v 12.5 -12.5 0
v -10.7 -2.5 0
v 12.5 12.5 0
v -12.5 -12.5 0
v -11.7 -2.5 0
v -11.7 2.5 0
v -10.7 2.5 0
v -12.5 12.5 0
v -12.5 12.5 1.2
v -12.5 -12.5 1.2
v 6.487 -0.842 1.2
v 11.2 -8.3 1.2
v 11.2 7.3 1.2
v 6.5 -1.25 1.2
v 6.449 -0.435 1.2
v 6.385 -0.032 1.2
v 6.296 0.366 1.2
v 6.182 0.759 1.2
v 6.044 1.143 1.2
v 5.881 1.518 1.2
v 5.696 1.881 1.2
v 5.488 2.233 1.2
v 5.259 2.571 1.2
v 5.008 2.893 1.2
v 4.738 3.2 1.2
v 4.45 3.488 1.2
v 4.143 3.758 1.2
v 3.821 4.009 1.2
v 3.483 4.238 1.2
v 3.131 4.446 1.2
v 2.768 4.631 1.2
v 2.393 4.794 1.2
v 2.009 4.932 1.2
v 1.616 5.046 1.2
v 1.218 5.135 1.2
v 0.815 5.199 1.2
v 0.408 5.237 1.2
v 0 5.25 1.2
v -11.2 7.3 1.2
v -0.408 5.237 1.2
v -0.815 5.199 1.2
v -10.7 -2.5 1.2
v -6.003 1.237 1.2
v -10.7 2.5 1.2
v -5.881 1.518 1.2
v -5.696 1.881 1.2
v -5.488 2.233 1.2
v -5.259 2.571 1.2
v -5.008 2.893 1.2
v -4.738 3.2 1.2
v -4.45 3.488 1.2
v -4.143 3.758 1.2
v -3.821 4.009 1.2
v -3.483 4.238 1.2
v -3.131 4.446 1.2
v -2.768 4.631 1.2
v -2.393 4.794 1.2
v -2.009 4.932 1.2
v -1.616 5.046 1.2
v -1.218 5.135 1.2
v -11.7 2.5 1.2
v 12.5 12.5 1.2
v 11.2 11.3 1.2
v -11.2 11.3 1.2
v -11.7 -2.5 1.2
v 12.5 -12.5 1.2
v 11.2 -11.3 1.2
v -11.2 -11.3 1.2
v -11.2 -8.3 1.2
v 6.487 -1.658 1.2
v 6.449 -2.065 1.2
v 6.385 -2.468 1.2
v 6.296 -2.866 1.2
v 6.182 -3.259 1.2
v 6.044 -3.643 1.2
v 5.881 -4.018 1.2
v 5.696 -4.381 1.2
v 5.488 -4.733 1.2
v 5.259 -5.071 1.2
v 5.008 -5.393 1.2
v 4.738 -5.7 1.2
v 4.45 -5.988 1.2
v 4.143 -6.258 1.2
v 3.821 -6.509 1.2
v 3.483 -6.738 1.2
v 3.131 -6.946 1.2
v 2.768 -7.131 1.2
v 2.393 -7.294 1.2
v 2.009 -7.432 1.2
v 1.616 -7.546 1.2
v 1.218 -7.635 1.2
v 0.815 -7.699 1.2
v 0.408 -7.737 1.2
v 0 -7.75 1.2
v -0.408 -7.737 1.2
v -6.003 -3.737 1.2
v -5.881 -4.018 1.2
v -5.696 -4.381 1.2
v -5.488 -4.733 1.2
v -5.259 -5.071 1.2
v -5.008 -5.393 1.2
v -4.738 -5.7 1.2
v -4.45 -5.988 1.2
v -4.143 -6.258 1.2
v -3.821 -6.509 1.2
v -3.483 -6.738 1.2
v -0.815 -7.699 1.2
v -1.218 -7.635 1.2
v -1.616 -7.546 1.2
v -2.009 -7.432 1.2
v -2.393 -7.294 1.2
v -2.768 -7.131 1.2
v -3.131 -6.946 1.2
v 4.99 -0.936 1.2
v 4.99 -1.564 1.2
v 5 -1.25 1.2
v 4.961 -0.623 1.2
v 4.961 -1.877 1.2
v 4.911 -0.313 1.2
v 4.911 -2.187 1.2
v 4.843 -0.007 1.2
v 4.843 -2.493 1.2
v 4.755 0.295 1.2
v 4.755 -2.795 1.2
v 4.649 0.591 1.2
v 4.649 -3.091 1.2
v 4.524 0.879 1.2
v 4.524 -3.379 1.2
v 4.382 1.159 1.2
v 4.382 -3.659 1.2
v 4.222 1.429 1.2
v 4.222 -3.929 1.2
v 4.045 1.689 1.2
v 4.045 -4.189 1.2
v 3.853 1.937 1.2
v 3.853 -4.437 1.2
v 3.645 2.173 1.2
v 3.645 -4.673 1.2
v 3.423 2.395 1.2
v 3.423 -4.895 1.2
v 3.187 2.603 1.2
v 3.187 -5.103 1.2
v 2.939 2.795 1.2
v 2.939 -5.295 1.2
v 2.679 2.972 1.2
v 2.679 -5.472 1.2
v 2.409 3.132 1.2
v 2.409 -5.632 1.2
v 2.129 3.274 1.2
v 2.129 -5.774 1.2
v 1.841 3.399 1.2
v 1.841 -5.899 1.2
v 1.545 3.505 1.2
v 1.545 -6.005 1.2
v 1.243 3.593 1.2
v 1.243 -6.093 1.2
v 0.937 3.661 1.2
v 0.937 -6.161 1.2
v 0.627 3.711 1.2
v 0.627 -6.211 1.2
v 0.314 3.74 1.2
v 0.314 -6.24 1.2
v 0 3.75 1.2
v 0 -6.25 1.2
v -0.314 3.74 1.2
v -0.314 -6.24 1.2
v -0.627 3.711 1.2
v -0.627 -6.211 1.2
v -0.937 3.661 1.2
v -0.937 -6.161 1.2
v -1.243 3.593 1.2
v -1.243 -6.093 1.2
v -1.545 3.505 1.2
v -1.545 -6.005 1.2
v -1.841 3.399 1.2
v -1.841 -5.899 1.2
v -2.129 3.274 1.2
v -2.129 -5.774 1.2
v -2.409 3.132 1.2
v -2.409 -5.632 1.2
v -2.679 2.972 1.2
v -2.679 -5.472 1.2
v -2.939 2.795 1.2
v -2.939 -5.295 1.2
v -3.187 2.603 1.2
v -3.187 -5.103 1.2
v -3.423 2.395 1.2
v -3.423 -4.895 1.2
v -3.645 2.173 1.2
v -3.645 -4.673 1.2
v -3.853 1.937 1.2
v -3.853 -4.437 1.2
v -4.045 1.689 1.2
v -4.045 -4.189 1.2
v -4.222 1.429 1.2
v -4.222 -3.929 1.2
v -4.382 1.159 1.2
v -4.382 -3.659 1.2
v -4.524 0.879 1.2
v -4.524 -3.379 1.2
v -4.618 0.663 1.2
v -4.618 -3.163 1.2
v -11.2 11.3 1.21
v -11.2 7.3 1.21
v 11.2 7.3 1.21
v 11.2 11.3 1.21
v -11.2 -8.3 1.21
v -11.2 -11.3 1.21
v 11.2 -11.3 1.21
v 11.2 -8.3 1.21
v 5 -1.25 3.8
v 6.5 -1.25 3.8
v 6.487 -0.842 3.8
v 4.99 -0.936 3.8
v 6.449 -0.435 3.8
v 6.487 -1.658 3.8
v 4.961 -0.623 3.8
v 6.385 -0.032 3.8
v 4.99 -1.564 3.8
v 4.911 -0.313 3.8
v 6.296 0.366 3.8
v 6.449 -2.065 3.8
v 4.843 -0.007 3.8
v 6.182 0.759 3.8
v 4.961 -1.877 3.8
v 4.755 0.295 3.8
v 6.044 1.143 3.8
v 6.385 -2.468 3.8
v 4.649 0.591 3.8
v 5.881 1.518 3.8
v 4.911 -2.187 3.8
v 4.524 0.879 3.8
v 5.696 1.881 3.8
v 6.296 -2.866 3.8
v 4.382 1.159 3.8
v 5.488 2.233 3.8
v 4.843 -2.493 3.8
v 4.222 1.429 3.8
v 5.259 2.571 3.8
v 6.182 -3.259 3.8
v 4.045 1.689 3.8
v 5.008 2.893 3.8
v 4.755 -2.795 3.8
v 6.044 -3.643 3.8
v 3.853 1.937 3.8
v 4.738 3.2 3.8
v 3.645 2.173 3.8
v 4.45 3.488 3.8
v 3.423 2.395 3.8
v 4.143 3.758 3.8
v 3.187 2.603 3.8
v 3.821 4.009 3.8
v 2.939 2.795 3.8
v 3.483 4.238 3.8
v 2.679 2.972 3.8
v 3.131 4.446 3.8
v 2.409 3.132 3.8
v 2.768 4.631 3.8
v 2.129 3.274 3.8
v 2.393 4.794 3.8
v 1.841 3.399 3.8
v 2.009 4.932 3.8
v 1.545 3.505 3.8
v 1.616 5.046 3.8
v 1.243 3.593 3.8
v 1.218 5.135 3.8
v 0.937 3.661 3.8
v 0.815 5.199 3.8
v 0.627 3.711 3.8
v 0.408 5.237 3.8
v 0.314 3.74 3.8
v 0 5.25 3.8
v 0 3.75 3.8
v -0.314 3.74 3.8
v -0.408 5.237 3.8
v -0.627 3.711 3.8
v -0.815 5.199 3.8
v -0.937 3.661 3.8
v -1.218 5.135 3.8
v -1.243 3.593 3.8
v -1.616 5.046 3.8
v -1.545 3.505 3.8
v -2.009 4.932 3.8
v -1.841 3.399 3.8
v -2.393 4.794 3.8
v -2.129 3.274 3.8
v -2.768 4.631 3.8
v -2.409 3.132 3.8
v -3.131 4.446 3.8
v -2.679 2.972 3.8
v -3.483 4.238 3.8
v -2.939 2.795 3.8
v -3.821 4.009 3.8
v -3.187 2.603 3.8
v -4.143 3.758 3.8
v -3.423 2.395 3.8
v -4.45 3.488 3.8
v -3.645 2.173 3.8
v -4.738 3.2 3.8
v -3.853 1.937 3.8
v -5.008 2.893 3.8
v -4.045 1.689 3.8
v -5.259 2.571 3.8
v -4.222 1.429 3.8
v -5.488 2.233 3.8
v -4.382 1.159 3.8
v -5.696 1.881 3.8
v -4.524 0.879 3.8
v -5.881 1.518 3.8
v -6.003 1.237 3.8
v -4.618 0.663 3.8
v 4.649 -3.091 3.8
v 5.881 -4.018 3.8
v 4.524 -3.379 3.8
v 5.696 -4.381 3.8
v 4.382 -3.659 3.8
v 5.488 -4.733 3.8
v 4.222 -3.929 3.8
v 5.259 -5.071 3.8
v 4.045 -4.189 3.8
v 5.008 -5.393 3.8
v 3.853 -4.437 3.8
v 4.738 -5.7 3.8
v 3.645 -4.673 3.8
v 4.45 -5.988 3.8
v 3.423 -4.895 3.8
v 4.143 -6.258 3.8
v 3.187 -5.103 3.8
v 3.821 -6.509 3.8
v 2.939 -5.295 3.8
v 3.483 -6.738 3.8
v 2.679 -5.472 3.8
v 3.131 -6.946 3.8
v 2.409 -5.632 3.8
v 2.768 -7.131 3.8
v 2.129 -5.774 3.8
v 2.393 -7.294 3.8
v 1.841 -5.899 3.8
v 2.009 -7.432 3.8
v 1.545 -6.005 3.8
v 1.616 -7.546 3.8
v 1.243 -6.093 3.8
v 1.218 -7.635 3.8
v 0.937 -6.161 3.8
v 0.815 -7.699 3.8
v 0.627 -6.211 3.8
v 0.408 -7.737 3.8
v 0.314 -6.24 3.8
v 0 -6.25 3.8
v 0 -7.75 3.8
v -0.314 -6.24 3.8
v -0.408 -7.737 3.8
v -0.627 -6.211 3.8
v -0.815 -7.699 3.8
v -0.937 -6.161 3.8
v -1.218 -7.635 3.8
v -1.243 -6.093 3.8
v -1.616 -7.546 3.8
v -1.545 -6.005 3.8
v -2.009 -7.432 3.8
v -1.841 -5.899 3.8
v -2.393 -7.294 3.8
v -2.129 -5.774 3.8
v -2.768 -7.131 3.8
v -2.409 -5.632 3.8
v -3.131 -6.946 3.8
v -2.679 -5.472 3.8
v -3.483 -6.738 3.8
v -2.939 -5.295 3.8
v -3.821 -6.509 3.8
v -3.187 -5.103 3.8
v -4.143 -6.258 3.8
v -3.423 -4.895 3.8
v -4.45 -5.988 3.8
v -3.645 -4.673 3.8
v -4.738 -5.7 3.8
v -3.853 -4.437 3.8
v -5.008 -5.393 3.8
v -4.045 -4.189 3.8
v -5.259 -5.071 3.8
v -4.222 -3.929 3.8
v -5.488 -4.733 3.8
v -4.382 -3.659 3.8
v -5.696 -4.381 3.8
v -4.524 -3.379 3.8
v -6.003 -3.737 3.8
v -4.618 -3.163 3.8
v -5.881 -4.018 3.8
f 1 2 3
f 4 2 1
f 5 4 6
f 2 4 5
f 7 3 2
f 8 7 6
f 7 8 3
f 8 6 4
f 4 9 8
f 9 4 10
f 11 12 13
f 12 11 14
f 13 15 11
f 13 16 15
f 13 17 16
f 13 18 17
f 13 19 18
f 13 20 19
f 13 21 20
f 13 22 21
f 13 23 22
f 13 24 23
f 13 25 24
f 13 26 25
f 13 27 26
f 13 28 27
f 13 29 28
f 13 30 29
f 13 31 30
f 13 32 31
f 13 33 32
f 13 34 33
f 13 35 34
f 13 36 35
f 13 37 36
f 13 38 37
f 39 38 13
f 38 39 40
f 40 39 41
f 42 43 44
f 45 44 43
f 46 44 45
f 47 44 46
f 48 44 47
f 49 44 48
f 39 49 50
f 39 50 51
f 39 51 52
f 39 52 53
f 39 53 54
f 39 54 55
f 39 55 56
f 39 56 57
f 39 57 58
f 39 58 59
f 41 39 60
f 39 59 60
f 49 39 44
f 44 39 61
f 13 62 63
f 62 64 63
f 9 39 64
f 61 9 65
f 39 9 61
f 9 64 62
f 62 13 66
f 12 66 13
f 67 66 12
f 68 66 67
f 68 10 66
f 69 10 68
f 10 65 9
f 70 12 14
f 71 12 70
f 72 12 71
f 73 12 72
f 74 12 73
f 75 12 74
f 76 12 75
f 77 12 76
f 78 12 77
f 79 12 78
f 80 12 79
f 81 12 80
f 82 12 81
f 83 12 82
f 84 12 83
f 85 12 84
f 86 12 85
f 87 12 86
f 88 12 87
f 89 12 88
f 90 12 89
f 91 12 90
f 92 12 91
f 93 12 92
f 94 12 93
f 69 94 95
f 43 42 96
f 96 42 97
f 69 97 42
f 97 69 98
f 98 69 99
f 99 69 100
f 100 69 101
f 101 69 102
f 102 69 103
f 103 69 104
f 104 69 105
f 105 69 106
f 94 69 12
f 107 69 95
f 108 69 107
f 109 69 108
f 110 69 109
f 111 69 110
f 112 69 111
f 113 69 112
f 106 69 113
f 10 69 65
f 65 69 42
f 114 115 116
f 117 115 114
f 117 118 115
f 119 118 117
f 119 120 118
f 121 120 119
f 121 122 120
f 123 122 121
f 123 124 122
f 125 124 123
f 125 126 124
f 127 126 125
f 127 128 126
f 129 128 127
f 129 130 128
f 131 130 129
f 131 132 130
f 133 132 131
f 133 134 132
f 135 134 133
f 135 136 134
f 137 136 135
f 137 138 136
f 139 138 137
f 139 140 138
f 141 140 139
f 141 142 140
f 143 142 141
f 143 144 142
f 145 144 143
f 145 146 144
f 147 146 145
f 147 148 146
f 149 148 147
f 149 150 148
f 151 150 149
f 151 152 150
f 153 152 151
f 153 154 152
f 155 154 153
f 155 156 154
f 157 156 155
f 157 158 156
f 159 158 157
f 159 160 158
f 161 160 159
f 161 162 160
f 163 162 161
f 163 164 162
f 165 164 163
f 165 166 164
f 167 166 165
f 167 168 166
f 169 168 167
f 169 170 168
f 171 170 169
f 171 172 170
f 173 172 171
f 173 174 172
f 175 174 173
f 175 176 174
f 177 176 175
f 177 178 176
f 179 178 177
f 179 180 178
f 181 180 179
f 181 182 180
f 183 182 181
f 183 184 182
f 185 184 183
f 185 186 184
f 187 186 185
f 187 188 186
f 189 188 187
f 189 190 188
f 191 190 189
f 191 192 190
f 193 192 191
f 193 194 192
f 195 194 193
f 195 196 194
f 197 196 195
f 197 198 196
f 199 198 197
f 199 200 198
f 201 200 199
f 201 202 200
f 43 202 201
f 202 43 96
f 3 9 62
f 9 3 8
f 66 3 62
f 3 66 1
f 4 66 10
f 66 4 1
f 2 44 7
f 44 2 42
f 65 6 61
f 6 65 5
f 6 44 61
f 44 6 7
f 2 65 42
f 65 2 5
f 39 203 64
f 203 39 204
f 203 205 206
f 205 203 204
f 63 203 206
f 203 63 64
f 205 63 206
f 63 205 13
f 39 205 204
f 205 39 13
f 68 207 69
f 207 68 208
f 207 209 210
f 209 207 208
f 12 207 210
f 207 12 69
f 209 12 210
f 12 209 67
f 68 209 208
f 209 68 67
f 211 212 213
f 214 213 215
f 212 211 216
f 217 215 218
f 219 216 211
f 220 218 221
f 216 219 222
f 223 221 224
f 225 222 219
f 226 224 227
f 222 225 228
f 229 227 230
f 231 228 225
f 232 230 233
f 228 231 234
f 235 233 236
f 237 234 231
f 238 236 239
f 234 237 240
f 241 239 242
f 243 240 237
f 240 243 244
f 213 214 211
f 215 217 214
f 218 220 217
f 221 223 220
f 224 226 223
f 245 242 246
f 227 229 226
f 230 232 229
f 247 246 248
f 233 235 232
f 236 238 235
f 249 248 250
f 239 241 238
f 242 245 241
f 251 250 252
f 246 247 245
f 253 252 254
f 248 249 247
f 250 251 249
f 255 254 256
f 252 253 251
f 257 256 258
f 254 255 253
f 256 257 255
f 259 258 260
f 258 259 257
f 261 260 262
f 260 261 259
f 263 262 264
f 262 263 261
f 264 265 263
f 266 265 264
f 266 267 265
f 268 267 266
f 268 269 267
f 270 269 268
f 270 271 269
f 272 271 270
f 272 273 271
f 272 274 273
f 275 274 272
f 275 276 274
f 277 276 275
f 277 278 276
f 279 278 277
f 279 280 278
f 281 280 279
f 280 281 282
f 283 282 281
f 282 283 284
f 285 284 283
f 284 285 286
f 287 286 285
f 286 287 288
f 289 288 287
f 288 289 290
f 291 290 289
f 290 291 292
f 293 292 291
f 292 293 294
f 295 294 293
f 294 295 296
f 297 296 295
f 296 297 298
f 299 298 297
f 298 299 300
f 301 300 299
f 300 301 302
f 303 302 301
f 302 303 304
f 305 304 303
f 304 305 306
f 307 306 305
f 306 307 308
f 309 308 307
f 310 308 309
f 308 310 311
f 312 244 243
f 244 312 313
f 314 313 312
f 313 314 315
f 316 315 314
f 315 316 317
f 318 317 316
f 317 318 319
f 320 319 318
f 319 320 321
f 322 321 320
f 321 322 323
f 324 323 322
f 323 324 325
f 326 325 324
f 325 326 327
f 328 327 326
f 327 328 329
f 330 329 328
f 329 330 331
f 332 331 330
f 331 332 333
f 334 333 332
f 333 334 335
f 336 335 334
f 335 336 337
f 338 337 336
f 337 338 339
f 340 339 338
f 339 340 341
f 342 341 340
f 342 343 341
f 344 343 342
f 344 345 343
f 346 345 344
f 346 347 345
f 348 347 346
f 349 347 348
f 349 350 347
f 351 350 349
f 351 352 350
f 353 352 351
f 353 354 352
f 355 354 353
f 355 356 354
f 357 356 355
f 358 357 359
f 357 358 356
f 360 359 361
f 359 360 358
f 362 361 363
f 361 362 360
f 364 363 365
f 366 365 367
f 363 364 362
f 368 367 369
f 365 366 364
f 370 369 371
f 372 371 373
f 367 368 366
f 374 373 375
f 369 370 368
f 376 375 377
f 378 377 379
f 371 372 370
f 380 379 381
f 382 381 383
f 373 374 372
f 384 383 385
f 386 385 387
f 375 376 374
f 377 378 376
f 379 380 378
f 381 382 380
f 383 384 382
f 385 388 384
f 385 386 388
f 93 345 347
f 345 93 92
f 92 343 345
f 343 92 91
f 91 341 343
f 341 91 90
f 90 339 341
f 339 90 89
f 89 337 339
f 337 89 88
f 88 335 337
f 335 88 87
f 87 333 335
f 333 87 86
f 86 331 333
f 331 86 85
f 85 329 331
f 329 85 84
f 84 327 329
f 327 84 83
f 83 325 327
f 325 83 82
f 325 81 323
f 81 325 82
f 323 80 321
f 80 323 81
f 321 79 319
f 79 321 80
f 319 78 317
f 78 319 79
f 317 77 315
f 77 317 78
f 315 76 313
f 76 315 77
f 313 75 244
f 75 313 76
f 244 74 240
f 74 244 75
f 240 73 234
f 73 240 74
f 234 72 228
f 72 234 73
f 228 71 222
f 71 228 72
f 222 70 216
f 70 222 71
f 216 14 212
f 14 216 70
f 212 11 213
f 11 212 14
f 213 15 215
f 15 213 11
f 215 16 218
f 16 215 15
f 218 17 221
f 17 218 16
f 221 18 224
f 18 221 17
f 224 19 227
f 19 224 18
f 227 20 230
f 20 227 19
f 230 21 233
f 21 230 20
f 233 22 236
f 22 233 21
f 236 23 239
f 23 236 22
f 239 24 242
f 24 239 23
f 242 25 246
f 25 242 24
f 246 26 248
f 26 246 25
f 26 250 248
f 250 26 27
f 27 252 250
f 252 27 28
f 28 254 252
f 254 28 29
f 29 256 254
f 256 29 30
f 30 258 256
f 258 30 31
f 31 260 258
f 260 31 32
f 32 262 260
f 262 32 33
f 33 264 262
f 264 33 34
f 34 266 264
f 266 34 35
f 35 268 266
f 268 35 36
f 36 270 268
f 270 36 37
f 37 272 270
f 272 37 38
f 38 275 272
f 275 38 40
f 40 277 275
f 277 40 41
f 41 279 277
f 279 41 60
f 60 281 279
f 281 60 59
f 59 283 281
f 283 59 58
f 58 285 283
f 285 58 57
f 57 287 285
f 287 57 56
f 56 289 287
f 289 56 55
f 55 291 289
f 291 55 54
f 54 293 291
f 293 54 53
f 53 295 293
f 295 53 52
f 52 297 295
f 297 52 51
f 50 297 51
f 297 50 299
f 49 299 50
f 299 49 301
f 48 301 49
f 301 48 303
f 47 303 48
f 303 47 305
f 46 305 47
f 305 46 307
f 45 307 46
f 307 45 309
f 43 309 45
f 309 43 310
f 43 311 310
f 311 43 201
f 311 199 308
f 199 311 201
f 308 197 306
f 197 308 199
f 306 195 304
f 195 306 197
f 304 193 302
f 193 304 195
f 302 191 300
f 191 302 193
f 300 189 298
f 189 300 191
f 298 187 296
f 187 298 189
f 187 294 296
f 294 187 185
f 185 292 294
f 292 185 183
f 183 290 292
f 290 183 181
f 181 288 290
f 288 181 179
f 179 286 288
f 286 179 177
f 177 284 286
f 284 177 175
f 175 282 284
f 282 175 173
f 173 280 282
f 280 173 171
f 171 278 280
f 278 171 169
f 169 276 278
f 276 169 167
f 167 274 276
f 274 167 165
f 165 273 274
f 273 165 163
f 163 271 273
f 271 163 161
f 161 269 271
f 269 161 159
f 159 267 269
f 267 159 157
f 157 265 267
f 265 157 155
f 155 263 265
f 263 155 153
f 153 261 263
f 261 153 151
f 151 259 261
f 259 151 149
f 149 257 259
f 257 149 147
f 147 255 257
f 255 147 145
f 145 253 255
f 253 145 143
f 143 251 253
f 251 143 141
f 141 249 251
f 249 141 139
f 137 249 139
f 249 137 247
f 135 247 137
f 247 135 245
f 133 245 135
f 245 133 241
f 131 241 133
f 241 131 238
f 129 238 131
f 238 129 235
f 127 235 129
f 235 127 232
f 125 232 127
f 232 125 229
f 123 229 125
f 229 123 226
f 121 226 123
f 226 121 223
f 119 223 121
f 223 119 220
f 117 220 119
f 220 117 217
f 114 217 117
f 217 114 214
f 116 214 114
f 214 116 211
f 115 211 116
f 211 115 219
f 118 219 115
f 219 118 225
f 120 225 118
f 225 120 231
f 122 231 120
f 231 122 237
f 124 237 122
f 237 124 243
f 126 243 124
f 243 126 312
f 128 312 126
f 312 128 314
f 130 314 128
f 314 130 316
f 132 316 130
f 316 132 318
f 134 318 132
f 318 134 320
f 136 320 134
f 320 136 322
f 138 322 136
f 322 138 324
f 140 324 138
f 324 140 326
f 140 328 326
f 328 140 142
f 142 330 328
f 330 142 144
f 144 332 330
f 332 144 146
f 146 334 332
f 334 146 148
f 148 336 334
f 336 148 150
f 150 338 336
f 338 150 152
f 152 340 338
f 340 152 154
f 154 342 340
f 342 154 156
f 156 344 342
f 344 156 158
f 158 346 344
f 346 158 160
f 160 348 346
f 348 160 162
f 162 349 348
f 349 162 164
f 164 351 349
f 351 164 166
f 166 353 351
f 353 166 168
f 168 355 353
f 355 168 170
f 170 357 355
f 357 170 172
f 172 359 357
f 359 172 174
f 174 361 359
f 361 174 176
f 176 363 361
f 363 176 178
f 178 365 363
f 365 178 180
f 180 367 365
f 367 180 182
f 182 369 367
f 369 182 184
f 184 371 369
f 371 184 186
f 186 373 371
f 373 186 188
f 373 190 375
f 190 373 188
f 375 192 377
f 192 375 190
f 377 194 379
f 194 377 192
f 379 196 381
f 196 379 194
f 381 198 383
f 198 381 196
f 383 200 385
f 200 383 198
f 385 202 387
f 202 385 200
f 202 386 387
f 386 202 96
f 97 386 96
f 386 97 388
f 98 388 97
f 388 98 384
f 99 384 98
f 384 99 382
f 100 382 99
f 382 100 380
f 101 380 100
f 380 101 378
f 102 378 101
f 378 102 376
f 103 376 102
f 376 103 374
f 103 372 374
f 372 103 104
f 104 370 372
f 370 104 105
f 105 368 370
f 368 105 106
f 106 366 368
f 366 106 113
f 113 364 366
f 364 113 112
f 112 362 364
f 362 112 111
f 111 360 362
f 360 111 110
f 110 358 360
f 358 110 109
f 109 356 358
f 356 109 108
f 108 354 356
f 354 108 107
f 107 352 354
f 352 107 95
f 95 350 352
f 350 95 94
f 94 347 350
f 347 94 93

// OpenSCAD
// ============================================================
// ERM 쪽 바닥 면 - 평면도(XY, 하우징 내부에서 바닥을 내려다본 모습)
// ============================================================

face_size      = 25;   // 면의 가로/세로 (정사각형)
housing_t      = 1.2;  // 하우징 두께 (사방 테두리)
border_gap     = 0.1;  // 테두리 안쪽 빈 공간 (Peltier 쪽 면과 동일한 규칙 적용)
peltier_t      = 4;    // Peltier 고정 두께 (Z 깊이는 다른 면 설계 시 결정)
gap_1          = 2.05; // 빈 공간 (peltier_t 5.5->4 축소로 생긴 1.5mm를 ERM 링과 가까운 이 gap에 보충)
erm_ring_t     = 1.5;  // ERM 고정 두께 (링 벽 두께)
erm_hole_d     = 10;   // ERM 부품이 들어갈 원형 공간 지름
gap_2          = 0.55; // 빈 공간 (ERM 링 두께 축소로 생긴 1mm 중 0.5mm 보충)
motor_driver_t = 3;    // 모터 드라이버 고정 두께 (Z 깊이는 다른 면 설계 시 결정)

erm_ring_z     = 2.6;  // ERM 고정 두께의 Z방향 깊이 (확정값)
guide_h        = 0.01; // 참고용 2D 레이아웃 표시용 얇은 두께

// --- Y축 경계 계산 (중심 원점, 위 -> 아래) ---
y_top    = face_size / 2;
y1 = y_top - housing_t;   // peltier 밴드 상단
y2 = y1 - peltier_t;      // gap_1 상단
y3 = y2 - gap_1;          // erm 링 위쪽 벽 상단
y4 = y3 - erm_ring_t;     // erm 구멍 상단
y5 = y4 - erm_hole_d;     // erm 구멍 하단 / 링 아래쪽 벽 상단
y6 = y5 - erm_ring_t;     // gap_2 상단
y7 = y6 - gap_2;          // 모터 드라이버 밴드 상단
y8 = y7 - motor_driver_t; // 하우징 아래쪽 테두리 상단
y_bottom = y8 - housing_t; // 검증용 (-face_size/2 와 같아야 함)

erm_center_y = (y4 + y5) / 2;
erm_inner_r  = erm_hole_d / 2;
erm_outer_r  = erm_inner_r + erm_ring_t;

frame_inner_w = face_size - 2 * housing_t;           // 테두리 프레임 안쪽 폭 (22.6mm)
inner_w       = face_size - 2 * (housing_t + border_gap); // 밴드 폭: 테두리+갭 안쪽 (22.4mm)

echo("y_bottom check =", y_bottom, " (should be", -face_size / 2, ")");
echo("ERM ring center_y =", erm_center_y, " inner_r =", erm_inner_r, " outer_r =", erm_outer_r);

// --- 참고용 2D 레이아웃 (Z 깊이 미정 영역, 반투명 표시) ---
module face_reference_2d() {
    // 하우징 바닥판 (면 전체, 실제 3D, 두께 1.2mm)
    // ERM 링이 뚫린 부분(9시 방향) 쪽, -X 가장자리에서 0.8mm 띄운 지점부터
    // (기존 0.2mm에서 ERM 링쪽으로 0.6mm 추가 이동)
    // 5mm(Y) x 1mm(X) 직사각형을 완전 관통(Z 1.2mm 전체). Y는 8.8mm씩 양쪽에서 띄워 중앙 정렬.
    color("gray")
        difference() {
            linear_extrude(height = housing_t)
                square([face_size, face_size], center = true);
            translate([-face_size / 2 + 0.8, -2.5, 0])
                cube([1, 5, housing_t]);
        }

    // Peltier 고정 영역 (Z는 다른 면 설계 시 결정, 바닥판 위에 참고 표시)
    color("orange", 0.3)
        translate([0, 0, housing_t])
            linear_extrude(height = guide_h)
                translate([0, y1 - peltier_t / 2])
                    square([inner_w, peltier_t], center = true);

    // 모터 드라이버 고정 영역 (Z는 다른 면 설계 시 결정, 바닥판 위에 참고 표시)
    color("cyan", 0.3)
        translate([0, 0, housing_t])
            linear_extrude(height = guide_h)
                translate([0, y7 - motor_driver_t / 2])
                    square([inner_w, motor_driver_t], center = true);
}

// ERM 링에서 잘라낼 구간: 9시 방향(180도) 기준 45도
erm_gap_center_deg = 180;
erm_gap_width_deg  = 45;
erm_gap_r          = erm_outer_r + 1; // 확실히 잘리도록 여유

// --- ERM 고정 링 (실제 3D, 바닥판 위에 Z 깊이 2.6mm 추가, 9시 방향 45도 절개) ---
module erm_ring() {
    color("SteelBlue")
        translate([0, erm_center_y, housing_t])
            linear_extrude(height = erm_ring_z)
                difference() {
                    difference() {
                        circle(r = erm_outer_r, $fn = 100);
                        circle(r = erm_inner_r, $fn = 100);
                    }
                    polygon(points = [
                        [0, 0],
                        [erm_gap_r * cos(erm_gap_center_deg - erm_gap_width_deg / 2),
                         erm_gap_r * sin(erm_gap_center_deg - erm_gap_width_deg / 2)],
                        [erm_gap_r * cos(erm_gap_center_deg + erm_gap_width_deg / 2),
                         erm_gap_r * sin(erm_gap_center_deg + erm_gap_width_deg / 2)]
                    ]);
                }
}

face_reference_2d();
erm_ring();
